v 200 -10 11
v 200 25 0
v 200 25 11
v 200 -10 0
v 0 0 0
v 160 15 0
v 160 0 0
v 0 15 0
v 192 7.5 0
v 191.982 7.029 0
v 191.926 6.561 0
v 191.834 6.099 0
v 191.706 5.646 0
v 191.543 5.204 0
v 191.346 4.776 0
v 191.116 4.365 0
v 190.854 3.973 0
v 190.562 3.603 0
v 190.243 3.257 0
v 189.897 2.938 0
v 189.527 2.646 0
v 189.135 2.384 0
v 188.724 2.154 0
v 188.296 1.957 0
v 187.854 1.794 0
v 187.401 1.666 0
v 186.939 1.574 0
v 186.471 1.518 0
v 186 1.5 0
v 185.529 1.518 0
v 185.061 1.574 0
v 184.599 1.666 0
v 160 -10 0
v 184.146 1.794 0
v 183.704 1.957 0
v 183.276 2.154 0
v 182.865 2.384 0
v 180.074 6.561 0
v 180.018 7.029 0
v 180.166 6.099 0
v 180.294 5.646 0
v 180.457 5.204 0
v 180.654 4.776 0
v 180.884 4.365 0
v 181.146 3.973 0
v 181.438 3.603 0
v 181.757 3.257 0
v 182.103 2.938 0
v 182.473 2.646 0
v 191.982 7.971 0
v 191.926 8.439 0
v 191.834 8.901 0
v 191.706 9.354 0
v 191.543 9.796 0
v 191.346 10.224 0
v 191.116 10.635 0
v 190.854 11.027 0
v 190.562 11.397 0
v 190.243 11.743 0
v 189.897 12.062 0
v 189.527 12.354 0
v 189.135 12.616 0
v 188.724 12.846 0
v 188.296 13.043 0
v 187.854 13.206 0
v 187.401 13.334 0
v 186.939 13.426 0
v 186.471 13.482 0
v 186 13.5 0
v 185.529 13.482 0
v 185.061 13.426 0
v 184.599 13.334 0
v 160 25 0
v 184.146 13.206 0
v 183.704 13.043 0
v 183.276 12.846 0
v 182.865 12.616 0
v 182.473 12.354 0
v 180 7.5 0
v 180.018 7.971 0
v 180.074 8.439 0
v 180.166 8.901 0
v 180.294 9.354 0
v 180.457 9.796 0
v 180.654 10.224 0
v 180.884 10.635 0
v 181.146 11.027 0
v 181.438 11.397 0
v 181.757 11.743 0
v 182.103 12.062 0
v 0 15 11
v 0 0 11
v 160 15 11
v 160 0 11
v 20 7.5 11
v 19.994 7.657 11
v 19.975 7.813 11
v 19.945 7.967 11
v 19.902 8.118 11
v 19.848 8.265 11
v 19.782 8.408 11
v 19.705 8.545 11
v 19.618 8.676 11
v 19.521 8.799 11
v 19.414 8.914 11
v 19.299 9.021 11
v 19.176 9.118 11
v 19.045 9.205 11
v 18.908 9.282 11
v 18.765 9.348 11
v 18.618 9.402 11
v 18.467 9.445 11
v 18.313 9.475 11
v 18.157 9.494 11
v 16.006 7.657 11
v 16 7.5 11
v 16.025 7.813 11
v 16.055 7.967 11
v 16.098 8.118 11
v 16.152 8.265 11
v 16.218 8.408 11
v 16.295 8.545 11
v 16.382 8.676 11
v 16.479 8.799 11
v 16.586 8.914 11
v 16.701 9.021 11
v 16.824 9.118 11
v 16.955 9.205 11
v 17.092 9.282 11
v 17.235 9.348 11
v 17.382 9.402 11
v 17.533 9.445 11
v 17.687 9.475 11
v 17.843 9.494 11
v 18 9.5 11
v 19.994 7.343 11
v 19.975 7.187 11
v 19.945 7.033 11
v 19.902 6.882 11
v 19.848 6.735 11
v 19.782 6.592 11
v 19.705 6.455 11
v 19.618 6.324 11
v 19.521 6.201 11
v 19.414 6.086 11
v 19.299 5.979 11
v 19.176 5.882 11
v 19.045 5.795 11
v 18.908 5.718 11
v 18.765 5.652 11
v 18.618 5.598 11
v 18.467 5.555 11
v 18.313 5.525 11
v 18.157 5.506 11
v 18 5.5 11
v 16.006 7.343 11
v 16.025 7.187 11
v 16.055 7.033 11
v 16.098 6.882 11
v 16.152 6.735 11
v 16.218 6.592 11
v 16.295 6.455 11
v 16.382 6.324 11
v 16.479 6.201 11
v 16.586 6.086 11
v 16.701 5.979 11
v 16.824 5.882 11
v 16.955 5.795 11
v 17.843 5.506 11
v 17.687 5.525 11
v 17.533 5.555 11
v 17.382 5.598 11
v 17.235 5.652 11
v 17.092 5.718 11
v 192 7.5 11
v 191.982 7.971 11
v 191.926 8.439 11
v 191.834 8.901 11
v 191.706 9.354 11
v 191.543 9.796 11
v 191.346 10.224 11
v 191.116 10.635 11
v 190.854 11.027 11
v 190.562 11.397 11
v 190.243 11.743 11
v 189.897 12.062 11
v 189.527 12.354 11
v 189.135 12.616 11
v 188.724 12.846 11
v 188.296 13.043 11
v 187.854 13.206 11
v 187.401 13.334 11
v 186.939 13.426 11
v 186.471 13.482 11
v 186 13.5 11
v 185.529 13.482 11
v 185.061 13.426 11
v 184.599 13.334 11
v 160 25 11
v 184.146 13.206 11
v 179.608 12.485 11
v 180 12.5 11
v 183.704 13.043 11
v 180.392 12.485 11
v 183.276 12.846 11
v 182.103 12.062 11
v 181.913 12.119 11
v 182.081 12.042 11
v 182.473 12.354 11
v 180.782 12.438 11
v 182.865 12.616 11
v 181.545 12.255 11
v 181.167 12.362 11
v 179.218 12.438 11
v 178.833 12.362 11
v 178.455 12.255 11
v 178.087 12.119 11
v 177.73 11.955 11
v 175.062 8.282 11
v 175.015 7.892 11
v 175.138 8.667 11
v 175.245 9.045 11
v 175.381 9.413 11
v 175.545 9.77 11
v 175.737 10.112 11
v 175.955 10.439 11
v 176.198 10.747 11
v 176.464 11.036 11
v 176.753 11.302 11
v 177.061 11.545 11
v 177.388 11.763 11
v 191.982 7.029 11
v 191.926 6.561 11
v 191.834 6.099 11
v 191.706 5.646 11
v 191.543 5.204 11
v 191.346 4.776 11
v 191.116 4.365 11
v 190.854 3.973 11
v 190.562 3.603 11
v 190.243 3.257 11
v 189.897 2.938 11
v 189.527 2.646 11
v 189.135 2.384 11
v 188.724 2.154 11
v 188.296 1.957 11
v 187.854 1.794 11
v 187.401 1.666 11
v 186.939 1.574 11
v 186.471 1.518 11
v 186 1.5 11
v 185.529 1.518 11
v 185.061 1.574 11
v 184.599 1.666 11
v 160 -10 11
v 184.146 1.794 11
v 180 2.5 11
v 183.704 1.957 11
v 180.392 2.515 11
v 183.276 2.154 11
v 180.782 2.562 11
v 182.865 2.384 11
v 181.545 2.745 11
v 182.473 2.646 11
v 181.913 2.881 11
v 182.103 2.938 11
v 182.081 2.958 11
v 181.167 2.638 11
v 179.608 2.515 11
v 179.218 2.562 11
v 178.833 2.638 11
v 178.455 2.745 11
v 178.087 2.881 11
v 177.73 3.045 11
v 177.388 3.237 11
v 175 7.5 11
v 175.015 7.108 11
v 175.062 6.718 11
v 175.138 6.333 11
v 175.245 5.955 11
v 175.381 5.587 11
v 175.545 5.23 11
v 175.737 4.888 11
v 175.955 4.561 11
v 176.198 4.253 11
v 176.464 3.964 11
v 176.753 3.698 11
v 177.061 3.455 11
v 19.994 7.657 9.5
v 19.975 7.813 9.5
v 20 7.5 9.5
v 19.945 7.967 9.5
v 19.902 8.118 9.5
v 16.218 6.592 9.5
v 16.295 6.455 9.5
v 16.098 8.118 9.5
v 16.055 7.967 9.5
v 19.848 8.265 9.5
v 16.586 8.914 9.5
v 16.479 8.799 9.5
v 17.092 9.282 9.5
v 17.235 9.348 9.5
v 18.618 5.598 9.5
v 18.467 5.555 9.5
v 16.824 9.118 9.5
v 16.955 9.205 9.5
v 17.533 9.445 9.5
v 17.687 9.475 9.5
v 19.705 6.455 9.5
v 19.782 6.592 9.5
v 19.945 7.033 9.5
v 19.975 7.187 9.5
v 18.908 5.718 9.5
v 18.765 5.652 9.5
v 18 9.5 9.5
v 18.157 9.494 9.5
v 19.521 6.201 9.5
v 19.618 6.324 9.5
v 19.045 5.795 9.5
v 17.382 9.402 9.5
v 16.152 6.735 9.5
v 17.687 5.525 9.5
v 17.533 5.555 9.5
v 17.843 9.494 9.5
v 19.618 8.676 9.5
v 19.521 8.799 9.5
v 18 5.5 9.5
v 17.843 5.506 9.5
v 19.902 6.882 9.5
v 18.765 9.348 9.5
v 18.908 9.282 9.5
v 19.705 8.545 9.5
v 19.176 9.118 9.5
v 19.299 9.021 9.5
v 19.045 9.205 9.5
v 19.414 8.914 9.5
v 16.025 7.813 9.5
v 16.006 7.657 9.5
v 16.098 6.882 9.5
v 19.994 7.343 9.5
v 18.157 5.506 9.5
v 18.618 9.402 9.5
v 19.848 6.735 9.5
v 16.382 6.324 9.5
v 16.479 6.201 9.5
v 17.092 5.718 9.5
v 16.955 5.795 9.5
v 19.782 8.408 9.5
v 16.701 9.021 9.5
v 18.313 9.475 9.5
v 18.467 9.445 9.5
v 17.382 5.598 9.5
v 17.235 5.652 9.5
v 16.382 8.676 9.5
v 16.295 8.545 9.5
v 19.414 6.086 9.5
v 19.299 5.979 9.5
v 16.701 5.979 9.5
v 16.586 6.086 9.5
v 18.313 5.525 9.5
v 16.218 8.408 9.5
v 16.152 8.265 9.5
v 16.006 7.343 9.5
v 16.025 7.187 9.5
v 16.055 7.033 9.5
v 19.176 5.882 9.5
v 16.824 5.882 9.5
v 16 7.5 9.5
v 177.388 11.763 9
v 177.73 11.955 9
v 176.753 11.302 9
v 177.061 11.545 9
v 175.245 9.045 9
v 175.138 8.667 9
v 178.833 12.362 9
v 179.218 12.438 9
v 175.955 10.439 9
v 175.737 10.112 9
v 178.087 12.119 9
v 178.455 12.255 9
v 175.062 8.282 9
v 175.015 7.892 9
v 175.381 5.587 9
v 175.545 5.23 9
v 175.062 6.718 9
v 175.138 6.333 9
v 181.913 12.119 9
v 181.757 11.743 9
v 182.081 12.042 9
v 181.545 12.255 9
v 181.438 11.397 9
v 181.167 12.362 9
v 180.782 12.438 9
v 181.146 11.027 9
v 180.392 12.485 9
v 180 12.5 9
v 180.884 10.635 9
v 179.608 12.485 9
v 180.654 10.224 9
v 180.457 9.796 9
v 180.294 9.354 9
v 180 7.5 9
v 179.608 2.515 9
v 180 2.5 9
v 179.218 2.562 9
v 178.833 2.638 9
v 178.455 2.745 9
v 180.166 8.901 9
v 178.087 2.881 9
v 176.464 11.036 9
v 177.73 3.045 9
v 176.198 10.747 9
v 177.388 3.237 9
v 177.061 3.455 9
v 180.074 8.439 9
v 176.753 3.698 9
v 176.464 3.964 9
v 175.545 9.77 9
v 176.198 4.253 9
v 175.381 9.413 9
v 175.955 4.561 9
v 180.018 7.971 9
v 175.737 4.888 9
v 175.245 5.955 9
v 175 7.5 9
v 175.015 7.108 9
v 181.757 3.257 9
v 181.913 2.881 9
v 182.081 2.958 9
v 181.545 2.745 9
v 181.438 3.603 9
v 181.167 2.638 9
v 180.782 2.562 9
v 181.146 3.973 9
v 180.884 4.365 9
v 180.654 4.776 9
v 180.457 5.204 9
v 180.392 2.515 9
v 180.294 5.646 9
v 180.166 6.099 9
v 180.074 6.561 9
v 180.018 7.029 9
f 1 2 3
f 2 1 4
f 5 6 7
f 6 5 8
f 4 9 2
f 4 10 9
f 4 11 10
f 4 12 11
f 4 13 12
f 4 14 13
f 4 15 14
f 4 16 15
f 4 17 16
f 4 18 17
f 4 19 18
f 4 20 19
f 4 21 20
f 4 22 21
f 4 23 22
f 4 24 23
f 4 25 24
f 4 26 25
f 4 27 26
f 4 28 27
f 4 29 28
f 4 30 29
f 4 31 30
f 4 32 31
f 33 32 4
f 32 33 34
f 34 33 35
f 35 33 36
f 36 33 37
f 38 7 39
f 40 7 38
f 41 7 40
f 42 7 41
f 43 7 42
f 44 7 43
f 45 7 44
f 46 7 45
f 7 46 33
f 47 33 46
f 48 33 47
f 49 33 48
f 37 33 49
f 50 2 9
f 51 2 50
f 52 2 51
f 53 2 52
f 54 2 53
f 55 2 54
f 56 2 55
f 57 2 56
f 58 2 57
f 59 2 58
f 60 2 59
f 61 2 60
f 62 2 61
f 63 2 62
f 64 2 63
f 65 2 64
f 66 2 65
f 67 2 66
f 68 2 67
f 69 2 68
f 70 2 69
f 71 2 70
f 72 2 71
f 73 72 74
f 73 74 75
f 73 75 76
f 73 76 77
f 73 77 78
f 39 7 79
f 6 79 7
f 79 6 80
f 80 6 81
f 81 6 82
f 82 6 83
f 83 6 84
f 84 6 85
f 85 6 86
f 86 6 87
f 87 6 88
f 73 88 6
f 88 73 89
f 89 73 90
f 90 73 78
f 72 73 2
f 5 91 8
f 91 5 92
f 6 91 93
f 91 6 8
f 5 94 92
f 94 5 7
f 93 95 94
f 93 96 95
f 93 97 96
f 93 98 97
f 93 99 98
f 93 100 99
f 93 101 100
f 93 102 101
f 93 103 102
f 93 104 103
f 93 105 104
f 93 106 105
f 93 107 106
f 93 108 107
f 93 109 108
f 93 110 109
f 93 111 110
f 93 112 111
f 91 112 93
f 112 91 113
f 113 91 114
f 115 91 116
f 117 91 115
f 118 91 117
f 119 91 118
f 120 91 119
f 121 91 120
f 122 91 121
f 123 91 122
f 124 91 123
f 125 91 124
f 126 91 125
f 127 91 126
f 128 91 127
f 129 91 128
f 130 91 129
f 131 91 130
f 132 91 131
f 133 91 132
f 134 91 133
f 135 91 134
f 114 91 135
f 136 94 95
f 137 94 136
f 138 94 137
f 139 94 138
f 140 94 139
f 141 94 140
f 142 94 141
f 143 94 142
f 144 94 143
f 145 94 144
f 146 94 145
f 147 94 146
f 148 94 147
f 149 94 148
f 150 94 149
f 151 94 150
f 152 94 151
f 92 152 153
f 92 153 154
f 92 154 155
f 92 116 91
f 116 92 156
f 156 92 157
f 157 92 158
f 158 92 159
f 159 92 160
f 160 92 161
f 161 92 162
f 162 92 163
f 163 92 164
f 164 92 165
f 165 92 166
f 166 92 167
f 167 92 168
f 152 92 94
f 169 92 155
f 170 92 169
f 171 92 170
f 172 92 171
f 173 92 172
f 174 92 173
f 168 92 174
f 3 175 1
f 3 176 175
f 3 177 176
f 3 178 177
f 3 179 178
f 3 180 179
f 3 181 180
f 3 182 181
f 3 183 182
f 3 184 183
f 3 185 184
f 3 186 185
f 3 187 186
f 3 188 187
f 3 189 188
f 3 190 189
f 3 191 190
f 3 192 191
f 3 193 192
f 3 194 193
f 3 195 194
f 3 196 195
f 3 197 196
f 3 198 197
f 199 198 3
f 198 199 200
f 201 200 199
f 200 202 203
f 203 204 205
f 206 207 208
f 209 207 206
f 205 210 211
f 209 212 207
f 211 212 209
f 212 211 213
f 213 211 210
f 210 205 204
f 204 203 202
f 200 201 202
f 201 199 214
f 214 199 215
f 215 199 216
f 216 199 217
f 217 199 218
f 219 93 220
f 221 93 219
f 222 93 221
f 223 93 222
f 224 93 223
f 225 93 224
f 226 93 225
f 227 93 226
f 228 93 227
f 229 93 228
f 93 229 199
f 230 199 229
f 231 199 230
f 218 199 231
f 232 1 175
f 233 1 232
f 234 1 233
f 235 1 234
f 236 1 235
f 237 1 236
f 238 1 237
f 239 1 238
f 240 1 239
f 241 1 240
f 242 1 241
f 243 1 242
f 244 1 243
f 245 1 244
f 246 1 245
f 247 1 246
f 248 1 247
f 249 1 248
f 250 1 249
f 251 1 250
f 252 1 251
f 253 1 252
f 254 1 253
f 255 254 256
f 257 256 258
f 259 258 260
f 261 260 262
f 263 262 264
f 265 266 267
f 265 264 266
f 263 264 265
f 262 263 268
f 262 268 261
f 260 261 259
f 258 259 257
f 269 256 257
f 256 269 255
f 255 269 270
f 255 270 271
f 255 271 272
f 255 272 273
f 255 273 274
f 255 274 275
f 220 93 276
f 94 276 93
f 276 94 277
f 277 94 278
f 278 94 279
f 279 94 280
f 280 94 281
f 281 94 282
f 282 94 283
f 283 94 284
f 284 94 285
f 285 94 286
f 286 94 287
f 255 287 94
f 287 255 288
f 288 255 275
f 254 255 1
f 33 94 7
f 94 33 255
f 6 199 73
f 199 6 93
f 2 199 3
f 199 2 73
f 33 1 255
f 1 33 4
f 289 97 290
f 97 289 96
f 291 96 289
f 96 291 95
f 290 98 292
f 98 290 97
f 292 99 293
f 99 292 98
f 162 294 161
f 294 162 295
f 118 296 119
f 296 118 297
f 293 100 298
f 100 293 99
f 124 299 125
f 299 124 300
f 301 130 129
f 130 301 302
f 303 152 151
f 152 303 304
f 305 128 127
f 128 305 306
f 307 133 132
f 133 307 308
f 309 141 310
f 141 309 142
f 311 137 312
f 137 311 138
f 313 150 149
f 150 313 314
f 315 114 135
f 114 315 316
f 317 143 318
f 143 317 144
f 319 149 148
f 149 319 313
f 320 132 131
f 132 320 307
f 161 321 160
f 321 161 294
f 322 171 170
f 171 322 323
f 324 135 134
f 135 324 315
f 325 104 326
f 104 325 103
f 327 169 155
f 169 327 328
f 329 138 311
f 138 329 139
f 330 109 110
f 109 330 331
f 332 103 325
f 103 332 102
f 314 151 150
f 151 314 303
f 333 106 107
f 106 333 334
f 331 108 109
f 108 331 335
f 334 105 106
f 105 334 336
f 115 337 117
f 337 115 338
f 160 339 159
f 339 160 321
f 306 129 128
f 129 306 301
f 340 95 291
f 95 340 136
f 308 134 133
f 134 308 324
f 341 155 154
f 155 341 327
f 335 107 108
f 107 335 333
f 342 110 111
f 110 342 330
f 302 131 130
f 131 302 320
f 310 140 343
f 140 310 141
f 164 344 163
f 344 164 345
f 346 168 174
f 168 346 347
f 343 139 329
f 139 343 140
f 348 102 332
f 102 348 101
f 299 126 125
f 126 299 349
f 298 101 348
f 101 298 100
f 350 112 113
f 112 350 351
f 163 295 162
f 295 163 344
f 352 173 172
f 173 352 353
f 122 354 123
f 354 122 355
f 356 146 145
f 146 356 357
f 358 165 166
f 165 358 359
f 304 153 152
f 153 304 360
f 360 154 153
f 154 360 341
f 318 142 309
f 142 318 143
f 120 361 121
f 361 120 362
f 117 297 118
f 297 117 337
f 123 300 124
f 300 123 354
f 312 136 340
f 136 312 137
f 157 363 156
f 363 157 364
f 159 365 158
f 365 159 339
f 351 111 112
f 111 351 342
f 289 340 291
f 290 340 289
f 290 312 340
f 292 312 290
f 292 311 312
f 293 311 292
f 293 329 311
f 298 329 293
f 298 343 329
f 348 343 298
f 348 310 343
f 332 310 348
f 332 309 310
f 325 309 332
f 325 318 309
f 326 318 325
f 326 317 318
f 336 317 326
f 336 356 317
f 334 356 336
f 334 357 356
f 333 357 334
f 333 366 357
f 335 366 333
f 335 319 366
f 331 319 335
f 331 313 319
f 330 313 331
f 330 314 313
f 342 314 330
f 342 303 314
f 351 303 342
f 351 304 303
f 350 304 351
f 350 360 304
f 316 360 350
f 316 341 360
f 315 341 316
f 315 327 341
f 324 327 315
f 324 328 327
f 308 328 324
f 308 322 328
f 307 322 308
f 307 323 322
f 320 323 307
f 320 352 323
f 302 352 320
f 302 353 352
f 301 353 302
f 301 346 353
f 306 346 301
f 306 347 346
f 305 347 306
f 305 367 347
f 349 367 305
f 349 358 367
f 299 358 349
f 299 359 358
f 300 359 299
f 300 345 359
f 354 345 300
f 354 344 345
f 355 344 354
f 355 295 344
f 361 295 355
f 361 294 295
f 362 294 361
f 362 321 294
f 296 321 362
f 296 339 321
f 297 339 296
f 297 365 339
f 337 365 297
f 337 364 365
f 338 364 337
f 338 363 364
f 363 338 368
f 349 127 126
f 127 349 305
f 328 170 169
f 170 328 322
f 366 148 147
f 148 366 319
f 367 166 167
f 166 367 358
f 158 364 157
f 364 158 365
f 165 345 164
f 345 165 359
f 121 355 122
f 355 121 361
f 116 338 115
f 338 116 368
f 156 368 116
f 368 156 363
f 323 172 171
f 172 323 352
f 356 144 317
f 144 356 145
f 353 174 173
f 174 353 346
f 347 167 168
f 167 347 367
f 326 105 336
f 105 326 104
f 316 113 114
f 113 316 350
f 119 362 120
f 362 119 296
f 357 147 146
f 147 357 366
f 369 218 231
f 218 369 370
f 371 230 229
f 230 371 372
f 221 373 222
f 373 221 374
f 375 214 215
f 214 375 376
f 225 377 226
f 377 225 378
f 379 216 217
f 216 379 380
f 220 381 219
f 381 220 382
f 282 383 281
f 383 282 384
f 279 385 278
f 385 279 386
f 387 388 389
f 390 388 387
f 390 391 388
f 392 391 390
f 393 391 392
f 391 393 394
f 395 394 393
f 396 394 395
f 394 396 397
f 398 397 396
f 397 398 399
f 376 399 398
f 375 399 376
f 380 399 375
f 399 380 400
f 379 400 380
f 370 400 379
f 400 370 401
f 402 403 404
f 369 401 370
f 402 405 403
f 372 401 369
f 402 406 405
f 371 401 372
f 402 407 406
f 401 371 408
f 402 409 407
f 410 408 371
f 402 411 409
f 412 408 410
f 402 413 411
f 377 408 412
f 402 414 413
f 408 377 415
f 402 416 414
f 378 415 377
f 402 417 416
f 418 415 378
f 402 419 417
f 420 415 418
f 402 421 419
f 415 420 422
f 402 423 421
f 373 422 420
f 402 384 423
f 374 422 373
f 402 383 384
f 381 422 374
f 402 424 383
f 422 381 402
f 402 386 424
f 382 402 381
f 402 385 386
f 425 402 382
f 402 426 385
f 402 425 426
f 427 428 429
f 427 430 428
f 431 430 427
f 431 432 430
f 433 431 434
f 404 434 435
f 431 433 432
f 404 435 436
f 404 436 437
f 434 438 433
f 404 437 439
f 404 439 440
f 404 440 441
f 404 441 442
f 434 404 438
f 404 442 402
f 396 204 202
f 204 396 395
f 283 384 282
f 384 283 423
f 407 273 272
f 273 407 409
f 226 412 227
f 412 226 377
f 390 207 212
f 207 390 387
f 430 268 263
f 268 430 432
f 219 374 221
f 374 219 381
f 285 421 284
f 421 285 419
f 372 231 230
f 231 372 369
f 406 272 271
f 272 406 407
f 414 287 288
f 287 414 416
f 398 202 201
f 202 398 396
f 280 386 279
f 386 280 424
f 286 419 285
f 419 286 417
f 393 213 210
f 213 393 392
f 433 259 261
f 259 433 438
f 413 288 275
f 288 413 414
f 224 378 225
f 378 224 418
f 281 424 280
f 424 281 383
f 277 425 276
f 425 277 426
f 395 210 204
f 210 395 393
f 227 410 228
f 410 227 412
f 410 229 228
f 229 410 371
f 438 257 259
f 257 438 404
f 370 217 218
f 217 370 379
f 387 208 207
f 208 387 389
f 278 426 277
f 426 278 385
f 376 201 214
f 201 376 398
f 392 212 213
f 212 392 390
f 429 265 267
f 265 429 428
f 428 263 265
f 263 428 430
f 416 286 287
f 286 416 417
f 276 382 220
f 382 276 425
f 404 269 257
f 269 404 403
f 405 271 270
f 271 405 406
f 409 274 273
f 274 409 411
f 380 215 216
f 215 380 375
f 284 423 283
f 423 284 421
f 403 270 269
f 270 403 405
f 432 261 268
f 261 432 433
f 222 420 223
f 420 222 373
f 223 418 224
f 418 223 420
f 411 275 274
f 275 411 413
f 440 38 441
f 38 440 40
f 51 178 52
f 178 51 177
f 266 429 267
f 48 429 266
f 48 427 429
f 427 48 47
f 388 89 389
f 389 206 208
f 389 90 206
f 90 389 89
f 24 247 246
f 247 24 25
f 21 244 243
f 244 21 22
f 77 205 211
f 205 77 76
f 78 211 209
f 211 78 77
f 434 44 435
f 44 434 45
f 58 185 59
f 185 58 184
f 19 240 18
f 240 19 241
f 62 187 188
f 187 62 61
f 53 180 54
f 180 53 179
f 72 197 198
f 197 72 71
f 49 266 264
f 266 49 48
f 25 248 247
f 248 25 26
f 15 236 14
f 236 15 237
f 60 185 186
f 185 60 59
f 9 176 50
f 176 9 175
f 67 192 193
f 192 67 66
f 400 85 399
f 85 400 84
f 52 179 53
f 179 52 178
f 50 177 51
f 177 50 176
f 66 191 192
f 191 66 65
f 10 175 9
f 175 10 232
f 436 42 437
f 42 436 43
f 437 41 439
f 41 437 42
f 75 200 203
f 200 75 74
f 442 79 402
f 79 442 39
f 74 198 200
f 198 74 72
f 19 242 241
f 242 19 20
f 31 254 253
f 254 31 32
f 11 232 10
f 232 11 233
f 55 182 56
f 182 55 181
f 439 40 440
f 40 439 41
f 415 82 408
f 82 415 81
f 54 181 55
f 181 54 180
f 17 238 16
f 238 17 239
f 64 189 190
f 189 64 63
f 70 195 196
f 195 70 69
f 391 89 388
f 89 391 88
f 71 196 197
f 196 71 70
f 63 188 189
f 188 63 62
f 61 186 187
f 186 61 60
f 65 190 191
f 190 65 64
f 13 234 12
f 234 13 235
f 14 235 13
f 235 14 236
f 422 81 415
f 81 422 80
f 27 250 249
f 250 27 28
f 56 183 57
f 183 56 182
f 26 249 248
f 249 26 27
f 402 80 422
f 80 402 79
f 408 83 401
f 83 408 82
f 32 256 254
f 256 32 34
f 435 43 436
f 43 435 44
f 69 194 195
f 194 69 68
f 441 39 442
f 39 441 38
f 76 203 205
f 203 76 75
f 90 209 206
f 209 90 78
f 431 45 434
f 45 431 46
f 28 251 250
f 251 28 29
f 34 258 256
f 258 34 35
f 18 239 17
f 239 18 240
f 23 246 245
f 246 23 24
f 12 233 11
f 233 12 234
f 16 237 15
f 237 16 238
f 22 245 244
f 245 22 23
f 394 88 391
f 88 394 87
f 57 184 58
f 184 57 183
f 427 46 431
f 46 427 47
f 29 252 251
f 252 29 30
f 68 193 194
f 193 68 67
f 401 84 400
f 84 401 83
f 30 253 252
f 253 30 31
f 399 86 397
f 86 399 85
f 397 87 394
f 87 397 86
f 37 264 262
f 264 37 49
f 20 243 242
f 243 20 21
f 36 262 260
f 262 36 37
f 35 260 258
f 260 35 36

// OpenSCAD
// =============================================
// Rail Part with End Block
// =============================================

// Main rail dimensions
rail_length = 200;        // total rail length
rail_width = 15;          // narrow rail width
rail_base_height = 8;     // base body height
rail_top_height = 3;      // shallow full-length top layer

// End block dimensions
block_width = 35;         // wider than rail
block_length = 40;        // block extent along rail
block_top_height = 3;     // matches rail top layer

// Rail recess features (near each end)
rail_recess_dia = 4;      // small circular recess diameter
rail_recess_depth = 1.5;  // shallow recess depth
rail_recess_inset = 18;   // distance from each rail end

// End block shallow recess
block_shallow_dia = 10;   // circular recess diameter
block_shallow_depth = 2;  // shallow depth on top layer

// End block deep cutout (stepped through base)
deep_cutout_dia = 12;     // diameter of deep cutout
deep_cutout_depth = 14;   // extends through base and beyond

// Resolution
$fn = 80;

// =============================================
// Module: Rail Body
// =============================================
module rail_body() {
    union() {
        // Base rail strip
        cube([rail_length, rail_width, rail_base_height]);
        // Shallow top layer spanning full rail
        translate([0, 0, rail_base_height])
            cube([rail_length, rail_width, rail_top_height]);
    }
}

// =============================================
// Module: End Block Body
// =============================================
module end_block_body() {
    // Position block at right end of rail, centered on rail width
    translate([rail_length - block_length, (rail_width - block_width) / 2, 0])
    union() {
        // Block base (same height as rail base)
        cube([block_length, block_width, rail_base_height]);
        // Block shallow top layer
        translate([0, 0, rail_base_height])
            cube([block_length, block_width, block_top_height]);
    }
}

// =============================================
// Module: Rail Recesses (small circles near ends)
// =============================================
module rail_recesses() {
    // Recess near left end
    translate([rail_recess_inset, rail_width / 2, rail_base_height + rail_top_height - rail_recess_depth])
        cylinder(d = rail_recess_dia, h = rail_recess_depth + 0.1);
    // Recess near right end (inside block area)
    translate([rail_length - rail_recess_inset, rail_width / 2, rail_base_height + rail_top_height - rail_recess_depth])
        cylinder(d = rail_recess_dia, h = rail_recess_depth + 0.1);
}

// =============================================
// Module: End Block Shallow Recess
// =============================================
module block_shallow_recess() {
    // Centered on block, shallow depth into top layer
    translate([
        rail_length - block_length / 2,
        rail_width / 2,
        rail_base_height + block_top_height - block_shallow_depth
    ])
        cylinder(d = block_shallow_dia, h = block_shallow_depth + 0.1);
}

// =============================================
// Module: End Block Deep Cutout
// =============================================
module block_deep_cutout() {
    // Deep cutout - offset from shallow recess, extends through base
    translate([
        rail_length - block_length / 2 + block_shallow_dia * 0.6,
        rail_width / 2,
        -0.1
    ])
        cylinder(d = deep_cutout_dia, h = deep_cutout_depth);
}

// =============================================
// Main Assembly
// =============================================
difference() {
    // Solid geometry: rail + end block
    union() {
        rail_body();
        end_block_body();
    }
    // Subtract all recesses and cutouts
    rail_recesses();
    block_shallow_recess();
    block_deep_cutout();
}
